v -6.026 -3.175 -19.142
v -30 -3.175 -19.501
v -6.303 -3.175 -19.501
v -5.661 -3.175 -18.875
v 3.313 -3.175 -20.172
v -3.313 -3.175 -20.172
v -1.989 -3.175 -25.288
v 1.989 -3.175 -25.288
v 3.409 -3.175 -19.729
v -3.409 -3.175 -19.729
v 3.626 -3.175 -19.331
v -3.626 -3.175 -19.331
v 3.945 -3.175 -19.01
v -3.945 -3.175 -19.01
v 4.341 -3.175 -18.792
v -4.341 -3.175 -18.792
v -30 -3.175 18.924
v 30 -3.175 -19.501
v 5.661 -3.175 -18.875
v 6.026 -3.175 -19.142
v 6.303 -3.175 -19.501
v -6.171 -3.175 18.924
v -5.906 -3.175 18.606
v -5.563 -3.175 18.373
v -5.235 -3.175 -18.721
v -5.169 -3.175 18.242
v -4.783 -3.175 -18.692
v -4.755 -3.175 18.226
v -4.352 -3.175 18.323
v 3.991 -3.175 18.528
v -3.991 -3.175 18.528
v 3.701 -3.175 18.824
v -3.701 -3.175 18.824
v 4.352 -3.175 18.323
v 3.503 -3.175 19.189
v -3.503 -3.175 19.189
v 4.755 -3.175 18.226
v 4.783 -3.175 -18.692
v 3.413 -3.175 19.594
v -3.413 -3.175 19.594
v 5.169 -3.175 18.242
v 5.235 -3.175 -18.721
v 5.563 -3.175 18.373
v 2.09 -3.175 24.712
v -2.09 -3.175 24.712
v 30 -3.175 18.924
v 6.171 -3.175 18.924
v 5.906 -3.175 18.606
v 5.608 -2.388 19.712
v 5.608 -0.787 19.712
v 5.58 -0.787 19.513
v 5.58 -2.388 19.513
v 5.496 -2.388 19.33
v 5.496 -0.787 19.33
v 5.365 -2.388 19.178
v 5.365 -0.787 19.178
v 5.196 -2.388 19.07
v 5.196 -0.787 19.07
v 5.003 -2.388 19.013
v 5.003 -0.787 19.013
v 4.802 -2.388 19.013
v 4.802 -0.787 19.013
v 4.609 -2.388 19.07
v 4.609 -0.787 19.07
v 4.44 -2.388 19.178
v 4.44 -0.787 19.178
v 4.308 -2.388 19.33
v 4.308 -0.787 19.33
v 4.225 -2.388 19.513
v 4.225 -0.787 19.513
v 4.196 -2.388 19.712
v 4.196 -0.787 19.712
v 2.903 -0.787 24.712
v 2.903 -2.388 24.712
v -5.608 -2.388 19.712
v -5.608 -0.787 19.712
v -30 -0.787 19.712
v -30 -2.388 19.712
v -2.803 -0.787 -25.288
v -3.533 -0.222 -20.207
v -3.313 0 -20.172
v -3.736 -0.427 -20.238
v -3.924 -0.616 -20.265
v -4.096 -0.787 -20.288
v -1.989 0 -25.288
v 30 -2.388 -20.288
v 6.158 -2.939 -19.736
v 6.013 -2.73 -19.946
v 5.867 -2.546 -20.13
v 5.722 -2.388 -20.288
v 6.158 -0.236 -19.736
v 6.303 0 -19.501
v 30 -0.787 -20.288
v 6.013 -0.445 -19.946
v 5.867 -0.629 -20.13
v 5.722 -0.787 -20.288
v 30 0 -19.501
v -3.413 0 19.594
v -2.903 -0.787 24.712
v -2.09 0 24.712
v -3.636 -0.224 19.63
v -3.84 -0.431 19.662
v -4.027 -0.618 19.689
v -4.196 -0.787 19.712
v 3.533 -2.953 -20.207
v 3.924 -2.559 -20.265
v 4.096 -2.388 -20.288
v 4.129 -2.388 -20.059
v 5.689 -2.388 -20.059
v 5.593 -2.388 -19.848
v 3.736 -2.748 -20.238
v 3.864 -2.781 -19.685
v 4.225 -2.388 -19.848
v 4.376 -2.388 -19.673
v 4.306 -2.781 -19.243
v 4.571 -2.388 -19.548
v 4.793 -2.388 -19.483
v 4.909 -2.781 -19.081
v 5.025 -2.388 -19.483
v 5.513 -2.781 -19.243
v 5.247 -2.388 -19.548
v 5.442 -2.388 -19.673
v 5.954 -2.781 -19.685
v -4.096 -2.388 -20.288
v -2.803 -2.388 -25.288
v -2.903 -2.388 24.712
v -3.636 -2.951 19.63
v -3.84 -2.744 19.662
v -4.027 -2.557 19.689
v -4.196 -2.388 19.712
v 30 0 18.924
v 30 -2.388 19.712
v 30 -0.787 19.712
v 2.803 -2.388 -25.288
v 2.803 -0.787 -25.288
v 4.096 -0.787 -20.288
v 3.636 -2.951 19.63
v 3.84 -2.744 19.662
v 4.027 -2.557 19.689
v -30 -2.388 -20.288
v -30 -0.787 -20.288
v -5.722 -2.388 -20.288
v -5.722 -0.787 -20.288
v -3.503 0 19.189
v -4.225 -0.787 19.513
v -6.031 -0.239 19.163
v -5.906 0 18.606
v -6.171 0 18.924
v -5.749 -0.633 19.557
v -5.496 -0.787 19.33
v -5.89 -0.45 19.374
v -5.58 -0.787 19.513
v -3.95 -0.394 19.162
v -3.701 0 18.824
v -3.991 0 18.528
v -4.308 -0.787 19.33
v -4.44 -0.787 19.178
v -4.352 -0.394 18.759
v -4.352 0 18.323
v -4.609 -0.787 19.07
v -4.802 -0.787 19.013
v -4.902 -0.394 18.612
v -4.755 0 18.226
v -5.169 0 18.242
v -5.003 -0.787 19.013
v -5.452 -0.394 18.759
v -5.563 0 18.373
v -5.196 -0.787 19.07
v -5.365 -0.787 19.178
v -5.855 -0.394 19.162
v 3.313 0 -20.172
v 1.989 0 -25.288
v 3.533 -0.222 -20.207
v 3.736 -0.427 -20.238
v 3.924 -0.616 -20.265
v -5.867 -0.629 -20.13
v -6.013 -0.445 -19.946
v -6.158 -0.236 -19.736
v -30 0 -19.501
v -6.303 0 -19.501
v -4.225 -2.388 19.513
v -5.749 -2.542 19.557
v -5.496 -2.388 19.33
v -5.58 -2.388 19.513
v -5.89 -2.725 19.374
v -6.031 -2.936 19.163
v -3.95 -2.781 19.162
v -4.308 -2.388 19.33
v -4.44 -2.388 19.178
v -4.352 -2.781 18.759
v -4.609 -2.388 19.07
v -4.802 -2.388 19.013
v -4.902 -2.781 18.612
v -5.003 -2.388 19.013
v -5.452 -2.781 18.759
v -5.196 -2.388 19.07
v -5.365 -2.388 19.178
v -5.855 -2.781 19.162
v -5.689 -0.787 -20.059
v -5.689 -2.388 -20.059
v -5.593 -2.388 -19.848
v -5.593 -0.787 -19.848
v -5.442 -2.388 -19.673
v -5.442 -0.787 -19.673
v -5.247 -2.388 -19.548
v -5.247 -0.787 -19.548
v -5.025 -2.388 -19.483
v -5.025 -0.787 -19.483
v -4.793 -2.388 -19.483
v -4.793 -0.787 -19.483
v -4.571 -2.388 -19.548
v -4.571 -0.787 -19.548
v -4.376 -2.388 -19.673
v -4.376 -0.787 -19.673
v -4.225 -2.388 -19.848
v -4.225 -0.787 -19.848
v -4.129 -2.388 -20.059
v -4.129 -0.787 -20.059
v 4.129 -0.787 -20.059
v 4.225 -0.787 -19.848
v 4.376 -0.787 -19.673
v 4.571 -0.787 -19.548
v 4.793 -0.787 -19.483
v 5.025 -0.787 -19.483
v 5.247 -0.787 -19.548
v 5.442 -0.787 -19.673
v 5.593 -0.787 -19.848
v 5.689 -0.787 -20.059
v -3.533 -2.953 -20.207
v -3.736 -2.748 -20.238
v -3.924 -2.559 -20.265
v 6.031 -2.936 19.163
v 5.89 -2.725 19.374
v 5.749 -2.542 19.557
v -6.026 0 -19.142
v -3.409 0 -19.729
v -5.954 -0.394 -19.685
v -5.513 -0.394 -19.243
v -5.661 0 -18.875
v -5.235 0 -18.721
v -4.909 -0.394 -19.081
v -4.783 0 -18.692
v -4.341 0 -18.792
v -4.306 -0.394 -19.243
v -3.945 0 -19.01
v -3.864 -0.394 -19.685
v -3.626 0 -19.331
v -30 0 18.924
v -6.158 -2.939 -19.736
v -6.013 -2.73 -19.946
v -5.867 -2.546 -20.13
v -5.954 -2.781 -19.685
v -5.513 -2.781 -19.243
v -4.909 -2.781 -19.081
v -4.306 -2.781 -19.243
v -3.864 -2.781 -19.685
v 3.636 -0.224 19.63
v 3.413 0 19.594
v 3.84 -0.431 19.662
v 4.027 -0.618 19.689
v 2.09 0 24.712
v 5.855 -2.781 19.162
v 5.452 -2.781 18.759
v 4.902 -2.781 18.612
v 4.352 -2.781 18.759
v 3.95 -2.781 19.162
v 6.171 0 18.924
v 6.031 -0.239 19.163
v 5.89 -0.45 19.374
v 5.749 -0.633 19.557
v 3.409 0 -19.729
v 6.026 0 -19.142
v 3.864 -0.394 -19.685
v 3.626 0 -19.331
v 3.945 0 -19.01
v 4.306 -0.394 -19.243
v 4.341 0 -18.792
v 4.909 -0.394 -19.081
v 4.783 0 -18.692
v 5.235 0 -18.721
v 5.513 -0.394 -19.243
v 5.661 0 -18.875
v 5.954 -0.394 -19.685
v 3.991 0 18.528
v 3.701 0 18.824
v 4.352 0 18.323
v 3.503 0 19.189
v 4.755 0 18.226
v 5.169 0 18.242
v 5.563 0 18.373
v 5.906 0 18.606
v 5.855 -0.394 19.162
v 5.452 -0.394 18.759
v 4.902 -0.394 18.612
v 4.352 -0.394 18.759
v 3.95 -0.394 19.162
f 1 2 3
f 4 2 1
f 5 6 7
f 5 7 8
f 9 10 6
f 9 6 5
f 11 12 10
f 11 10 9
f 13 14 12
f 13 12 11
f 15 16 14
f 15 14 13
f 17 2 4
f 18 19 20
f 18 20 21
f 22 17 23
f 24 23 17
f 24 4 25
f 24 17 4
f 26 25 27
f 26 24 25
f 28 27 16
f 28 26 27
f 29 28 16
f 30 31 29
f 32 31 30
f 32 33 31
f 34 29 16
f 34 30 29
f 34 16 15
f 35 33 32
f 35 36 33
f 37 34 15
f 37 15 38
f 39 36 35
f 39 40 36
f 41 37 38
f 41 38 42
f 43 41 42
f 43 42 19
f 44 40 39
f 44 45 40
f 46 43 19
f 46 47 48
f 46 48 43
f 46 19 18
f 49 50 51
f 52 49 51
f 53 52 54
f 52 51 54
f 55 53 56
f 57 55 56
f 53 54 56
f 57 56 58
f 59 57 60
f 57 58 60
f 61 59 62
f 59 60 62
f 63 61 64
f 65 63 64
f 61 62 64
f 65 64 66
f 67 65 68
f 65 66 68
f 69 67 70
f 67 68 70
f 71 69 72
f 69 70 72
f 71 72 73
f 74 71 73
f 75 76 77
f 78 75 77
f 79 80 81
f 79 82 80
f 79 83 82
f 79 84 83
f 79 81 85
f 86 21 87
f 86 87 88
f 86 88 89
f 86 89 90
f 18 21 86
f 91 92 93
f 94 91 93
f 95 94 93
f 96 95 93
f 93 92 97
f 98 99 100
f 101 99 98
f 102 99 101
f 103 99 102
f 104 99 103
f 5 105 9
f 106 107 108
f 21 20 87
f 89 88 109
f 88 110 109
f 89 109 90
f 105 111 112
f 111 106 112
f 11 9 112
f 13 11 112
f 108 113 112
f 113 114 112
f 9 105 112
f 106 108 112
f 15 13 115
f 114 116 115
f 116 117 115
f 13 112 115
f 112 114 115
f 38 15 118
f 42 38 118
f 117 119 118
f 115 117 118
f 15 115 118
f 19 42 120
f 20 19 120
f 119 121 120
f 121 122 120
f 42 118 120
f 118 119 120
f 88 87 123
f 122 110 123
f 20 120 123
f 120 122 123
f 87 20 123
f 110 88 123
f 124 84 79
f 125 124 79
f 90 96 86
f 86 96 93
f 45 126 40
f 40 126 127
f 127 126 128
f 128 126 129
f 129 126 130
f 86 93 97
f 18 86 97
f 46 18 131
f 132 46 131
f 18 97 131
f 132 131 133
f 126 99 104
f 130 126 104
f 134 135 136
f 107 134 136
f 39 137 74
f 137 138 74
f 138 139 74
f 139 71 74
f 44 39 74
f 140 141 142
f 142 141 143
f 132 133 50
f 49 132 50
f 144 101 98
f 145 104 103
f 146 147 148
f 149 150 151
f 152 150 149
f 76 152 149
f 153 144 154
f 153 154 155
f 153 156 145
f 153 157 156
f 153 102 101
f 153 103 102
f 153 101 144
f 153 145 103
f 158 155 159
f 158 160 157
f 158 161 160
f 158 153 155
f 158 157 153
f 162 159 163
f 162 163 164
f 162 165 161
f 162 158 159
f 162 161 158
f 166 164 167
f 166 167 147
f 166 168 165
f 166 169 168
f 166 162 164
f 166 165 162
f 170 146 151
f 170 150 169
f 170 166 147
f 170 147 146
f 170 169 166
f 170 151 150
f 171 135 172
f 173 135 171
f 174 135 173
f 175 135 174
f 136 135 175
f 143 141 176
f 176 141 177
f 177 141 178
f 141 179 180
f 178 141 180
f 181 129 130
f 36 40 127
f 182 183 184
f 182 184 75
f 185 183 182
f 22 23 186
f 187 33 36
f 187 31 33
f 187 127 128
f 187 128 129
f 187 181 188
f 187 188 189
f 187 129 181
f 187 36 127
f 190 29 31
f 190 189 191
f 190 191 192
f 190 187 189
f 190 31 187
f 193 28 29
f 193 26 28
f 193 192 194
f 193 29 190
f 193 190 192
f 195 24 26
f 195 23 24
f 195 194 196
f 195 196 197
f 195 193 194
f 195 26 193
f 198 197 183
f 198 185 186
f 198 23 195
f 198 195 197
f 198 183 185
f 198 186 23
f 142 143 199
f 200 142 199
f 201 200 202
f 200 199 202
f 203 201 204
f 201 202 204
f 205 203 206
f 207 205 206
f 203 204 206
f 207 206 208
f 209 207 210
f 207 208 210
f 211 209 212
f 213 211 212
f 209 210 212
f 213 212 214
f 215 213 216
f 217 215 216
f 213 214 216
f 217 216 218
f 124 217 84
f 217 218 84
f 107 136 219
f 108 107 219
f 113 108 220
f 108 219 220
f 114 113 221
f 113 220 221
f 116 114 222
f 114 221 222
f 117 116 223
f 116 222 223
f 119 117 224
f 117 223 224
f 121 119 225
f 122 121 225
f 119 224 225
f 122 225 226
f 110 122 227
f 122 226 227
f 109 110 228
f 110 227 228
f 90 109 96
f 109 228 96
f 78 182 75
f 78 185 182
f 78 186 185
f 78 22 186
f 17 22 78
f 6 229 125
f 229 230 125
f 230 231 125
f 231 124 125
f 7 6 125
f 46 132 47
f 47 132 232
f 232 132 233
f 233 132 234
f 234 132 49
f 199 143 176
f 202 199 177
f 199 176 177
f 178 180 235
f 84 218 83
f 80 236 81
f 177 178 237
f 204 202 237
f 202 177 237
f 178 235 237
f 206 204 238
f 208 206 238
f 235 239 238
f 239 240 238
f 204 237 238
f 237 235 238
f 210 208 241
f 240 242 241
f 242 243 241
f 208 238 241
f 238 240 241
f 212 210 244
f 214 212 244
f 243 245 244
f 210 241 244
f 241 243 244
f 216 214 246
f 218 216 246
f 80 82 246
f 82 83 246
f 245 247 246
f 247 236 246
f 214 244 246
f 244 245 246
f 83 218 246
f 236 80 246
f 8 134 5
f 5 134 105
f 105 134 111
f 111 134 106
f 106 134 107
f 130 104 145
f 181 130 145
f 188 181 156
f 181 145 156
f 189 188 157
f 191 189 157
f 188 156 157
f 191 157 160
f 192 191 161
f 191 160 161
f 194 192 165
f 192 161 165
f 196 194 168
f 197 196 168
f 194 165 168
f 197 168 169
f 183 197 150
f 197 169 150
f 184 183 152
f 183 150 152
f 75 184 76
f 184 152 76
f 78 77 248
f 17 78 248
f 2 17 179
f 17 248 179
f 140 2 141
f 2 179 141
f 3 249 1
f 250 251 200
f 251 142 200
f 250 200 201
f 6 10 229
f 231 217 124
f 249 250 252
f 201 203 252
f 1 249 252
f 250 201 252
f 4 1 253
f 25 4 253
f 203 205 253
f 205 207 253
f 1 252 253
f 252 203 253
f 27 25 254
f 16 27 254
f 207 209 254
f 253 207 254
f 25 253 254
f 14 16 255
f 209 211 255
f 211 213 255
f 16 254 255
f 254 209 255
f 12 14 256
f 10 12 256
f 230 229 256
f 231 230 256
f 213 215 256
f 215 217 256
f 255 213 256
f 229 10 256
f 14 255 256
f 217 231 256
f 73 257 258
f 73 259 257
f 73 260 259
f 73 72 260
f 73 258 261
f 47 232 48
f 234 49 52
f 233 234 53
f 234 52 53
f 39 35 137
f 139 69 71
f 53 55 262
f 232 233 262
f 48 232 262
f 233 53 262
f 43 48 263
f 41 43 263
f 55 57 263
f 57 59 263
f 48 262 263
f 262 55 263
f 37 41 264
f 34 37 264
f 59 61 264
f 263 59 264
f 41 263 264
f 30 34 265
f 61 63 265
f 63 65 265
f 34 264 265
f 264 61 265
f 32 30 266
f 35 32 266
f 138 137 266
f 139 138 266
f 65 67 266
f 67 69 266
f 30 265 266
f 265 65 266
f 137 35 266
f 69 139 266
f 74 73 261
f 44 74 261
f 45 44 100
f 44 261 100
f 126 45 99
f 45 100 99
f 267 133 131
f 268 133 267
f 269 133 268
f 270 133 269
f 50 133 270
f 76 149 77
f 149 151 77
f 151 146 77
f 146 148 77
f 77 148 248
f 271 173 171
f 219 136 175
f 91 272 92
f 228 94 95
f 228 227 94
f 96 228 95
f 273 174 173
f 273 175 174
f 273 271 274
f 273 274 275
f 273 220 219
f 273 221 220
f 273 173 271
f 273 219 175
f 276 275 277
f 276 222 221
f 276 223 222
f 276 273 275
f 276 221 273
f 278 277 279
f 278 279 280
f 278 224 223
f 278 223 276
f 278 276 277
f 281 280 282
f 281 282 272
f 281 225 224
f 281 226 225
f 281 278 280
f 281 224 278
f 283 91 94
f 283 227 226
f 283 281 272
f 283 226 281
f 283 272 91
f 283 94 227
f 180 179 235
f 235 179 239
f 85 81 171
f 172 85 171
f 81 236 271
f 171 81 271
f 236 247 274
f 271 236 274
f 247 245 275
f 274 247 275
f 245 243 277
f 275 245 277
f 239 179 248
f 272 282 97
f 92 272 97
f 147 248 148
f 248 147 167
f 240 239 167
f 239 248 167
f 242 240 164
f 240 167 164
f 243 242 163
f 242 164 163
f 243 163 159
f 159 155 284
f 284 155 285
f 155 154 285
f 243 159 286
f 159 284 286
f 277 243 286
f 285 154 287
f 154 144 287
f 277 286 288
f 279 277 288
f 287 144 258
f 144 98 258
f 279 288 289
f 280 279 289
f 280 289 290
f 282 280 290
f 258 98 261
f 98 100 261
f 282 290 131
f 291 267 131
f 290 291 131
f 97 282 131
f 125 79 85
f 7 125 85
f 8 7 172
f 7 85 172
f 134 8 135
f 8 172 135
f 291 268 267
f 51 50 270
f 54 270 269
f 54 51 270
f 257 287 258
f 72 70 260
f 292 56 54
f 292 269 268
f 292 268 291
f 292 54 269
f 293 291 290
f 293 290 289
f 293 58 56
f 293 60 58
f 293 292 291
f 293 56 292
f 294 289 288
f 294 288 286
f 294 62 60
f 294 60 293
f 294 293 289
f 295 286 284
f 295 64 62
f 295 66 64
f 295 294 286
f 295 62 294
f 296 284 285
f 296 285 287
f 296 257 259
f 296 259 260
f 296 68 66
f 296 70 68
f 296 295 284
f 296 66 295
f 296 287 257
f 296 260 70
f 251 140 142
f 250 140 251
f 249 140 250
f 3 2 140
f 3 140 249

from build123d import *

# Parameters (mm, degrees)
F1_DEPTH = 3.175
F2_SIZE  = 0.7874
F3_SIZE  = 0.7874
F4_SIZE  = 0.7874
F5_SIZE  = 0.7874
F6_SIZE  = 0.7874
F7_SIZE  = 0.7874


with BuildPart() as f1:
    # F0 (on Front) → F1 (new body)
    with BuildSketch(Plane.XZ):
        with BuildLine():
            Line((-30, 19.711864), (-30, -20.288136))
            Line((-30, -20.288136), (-5.722361, -20.288136))
            ThreePointArc((-5.722361, -20.288136), (-4.909056, -19.47483), (-4.09575, -20.288136))
            Line((-4.09575, -20.288136), (-2.802662, -25.288136))
            Line((-2.802662, -25.288136), (2.802662, -25.288136))
            Line((2.802662, -25.288136), (4.09575, -20.288136))
            ThreePointArc((4.09575, -20.288136), (4.909056, -19.47483), (5.722361, -20.288136))
            Line((5.722361, -20.288136), (30, -20.288136))
            Line((30, -20.288136), (30, -19.711864))
            Line((30, -19.711864), (30, 19.711864))
            Line((30, 19.711864), (5.60832, 19.711864))
            ThreePointArc((5.60832, 19.711864), (4.9022, 19.005744), (4.19608, 19.711864))
            Line((4.19608, 19.711864), (2.902992, 24.711864))
            Line((2.902992, 24.711864), (-2.902992, 24.711864))
            Line((-2.902992, 24.711864), (-4.19608, 19.711864))
            ThreePointArc((-4.19608, 19.711864), (-4.9022, 19.005744), (-5.60832, 19.711864))
            Line((-5.60832, 19.711864), (-30, 19.711864))
        make_face()
    extrude(amount=F1_DEPTH)

    # F2
    f2_edges = [f1.edges().sort_by_distance(p)[0] for p in [
        (-17.861181, 0, -20.288136),
        (17.861181, 0, -20.288136),
        (17.861181, -3.175, -20.288136),
        (-17.861181, -3.175, -20.288136),
    ]]
    chamfer(f2_edges, length=F2_SIZE)

    # F3
    f3_edges = [f1.edges().sort_by_distance(p)[0] for p in [
        (3.549536, 0, 22.211864),
        (4.9022, 0, 19.005744),
        (-3.549536, 0, 22.211864),
        (-4.9022, 0, 19.005744),
    ]]
    chamfer(f3_edges, length=F3_SIZE)

    # F4
    f4_edges = [f1.edges().sort_by_distance(p)[0] for p in [
        (4.9022, -3.175, 19.005744),
        (3.549536, -3.175, 22.211864),
        (-3.549536, -3.175, 22.211864),
        (-4.9022, -3.175, 19.005744),
    ]]
    chamfer(f4_edges, length=F4_SIZE)

    # F5
    f5_edges = [f1.edges().sort_by_distance(p)[0] for p in [
        (18.19786, -3.175, 19.711864),
        (-18.19786, -3.175, 19.711864),
        (18.19786, 0, 19.711864),
        (-18.19786, 0, 19.711864),
    ]]
    chamfer(f5_edges, length=F5_SIZE)

    # F6
    f6_edges = [f1.edges().sort_by_distance(p)[0] for p in [
        (3.449206, -3.175, -22.788136),
        (4.411136, -3.175, -19.645063),
        (-3.449206, -3.175, -22.788136),
        (-4.411136, -3.175, -19.645063),
    ]]
    chamfer(f6_edges, length=F6_SIZE)

    # F7
    f7_edges = [f1.edges().sort_by_distance(p)[0] for p in [
        (3.449206, 0, -22.788136),
        (4.411136, 0, -19.645063),
        (-3.449206, 0, -22.788136),
        (-4.411136, 0, -19.645063),
    ]]
    chamfer(f7_edges, length=F7_SIZE)


solid = f1.part
